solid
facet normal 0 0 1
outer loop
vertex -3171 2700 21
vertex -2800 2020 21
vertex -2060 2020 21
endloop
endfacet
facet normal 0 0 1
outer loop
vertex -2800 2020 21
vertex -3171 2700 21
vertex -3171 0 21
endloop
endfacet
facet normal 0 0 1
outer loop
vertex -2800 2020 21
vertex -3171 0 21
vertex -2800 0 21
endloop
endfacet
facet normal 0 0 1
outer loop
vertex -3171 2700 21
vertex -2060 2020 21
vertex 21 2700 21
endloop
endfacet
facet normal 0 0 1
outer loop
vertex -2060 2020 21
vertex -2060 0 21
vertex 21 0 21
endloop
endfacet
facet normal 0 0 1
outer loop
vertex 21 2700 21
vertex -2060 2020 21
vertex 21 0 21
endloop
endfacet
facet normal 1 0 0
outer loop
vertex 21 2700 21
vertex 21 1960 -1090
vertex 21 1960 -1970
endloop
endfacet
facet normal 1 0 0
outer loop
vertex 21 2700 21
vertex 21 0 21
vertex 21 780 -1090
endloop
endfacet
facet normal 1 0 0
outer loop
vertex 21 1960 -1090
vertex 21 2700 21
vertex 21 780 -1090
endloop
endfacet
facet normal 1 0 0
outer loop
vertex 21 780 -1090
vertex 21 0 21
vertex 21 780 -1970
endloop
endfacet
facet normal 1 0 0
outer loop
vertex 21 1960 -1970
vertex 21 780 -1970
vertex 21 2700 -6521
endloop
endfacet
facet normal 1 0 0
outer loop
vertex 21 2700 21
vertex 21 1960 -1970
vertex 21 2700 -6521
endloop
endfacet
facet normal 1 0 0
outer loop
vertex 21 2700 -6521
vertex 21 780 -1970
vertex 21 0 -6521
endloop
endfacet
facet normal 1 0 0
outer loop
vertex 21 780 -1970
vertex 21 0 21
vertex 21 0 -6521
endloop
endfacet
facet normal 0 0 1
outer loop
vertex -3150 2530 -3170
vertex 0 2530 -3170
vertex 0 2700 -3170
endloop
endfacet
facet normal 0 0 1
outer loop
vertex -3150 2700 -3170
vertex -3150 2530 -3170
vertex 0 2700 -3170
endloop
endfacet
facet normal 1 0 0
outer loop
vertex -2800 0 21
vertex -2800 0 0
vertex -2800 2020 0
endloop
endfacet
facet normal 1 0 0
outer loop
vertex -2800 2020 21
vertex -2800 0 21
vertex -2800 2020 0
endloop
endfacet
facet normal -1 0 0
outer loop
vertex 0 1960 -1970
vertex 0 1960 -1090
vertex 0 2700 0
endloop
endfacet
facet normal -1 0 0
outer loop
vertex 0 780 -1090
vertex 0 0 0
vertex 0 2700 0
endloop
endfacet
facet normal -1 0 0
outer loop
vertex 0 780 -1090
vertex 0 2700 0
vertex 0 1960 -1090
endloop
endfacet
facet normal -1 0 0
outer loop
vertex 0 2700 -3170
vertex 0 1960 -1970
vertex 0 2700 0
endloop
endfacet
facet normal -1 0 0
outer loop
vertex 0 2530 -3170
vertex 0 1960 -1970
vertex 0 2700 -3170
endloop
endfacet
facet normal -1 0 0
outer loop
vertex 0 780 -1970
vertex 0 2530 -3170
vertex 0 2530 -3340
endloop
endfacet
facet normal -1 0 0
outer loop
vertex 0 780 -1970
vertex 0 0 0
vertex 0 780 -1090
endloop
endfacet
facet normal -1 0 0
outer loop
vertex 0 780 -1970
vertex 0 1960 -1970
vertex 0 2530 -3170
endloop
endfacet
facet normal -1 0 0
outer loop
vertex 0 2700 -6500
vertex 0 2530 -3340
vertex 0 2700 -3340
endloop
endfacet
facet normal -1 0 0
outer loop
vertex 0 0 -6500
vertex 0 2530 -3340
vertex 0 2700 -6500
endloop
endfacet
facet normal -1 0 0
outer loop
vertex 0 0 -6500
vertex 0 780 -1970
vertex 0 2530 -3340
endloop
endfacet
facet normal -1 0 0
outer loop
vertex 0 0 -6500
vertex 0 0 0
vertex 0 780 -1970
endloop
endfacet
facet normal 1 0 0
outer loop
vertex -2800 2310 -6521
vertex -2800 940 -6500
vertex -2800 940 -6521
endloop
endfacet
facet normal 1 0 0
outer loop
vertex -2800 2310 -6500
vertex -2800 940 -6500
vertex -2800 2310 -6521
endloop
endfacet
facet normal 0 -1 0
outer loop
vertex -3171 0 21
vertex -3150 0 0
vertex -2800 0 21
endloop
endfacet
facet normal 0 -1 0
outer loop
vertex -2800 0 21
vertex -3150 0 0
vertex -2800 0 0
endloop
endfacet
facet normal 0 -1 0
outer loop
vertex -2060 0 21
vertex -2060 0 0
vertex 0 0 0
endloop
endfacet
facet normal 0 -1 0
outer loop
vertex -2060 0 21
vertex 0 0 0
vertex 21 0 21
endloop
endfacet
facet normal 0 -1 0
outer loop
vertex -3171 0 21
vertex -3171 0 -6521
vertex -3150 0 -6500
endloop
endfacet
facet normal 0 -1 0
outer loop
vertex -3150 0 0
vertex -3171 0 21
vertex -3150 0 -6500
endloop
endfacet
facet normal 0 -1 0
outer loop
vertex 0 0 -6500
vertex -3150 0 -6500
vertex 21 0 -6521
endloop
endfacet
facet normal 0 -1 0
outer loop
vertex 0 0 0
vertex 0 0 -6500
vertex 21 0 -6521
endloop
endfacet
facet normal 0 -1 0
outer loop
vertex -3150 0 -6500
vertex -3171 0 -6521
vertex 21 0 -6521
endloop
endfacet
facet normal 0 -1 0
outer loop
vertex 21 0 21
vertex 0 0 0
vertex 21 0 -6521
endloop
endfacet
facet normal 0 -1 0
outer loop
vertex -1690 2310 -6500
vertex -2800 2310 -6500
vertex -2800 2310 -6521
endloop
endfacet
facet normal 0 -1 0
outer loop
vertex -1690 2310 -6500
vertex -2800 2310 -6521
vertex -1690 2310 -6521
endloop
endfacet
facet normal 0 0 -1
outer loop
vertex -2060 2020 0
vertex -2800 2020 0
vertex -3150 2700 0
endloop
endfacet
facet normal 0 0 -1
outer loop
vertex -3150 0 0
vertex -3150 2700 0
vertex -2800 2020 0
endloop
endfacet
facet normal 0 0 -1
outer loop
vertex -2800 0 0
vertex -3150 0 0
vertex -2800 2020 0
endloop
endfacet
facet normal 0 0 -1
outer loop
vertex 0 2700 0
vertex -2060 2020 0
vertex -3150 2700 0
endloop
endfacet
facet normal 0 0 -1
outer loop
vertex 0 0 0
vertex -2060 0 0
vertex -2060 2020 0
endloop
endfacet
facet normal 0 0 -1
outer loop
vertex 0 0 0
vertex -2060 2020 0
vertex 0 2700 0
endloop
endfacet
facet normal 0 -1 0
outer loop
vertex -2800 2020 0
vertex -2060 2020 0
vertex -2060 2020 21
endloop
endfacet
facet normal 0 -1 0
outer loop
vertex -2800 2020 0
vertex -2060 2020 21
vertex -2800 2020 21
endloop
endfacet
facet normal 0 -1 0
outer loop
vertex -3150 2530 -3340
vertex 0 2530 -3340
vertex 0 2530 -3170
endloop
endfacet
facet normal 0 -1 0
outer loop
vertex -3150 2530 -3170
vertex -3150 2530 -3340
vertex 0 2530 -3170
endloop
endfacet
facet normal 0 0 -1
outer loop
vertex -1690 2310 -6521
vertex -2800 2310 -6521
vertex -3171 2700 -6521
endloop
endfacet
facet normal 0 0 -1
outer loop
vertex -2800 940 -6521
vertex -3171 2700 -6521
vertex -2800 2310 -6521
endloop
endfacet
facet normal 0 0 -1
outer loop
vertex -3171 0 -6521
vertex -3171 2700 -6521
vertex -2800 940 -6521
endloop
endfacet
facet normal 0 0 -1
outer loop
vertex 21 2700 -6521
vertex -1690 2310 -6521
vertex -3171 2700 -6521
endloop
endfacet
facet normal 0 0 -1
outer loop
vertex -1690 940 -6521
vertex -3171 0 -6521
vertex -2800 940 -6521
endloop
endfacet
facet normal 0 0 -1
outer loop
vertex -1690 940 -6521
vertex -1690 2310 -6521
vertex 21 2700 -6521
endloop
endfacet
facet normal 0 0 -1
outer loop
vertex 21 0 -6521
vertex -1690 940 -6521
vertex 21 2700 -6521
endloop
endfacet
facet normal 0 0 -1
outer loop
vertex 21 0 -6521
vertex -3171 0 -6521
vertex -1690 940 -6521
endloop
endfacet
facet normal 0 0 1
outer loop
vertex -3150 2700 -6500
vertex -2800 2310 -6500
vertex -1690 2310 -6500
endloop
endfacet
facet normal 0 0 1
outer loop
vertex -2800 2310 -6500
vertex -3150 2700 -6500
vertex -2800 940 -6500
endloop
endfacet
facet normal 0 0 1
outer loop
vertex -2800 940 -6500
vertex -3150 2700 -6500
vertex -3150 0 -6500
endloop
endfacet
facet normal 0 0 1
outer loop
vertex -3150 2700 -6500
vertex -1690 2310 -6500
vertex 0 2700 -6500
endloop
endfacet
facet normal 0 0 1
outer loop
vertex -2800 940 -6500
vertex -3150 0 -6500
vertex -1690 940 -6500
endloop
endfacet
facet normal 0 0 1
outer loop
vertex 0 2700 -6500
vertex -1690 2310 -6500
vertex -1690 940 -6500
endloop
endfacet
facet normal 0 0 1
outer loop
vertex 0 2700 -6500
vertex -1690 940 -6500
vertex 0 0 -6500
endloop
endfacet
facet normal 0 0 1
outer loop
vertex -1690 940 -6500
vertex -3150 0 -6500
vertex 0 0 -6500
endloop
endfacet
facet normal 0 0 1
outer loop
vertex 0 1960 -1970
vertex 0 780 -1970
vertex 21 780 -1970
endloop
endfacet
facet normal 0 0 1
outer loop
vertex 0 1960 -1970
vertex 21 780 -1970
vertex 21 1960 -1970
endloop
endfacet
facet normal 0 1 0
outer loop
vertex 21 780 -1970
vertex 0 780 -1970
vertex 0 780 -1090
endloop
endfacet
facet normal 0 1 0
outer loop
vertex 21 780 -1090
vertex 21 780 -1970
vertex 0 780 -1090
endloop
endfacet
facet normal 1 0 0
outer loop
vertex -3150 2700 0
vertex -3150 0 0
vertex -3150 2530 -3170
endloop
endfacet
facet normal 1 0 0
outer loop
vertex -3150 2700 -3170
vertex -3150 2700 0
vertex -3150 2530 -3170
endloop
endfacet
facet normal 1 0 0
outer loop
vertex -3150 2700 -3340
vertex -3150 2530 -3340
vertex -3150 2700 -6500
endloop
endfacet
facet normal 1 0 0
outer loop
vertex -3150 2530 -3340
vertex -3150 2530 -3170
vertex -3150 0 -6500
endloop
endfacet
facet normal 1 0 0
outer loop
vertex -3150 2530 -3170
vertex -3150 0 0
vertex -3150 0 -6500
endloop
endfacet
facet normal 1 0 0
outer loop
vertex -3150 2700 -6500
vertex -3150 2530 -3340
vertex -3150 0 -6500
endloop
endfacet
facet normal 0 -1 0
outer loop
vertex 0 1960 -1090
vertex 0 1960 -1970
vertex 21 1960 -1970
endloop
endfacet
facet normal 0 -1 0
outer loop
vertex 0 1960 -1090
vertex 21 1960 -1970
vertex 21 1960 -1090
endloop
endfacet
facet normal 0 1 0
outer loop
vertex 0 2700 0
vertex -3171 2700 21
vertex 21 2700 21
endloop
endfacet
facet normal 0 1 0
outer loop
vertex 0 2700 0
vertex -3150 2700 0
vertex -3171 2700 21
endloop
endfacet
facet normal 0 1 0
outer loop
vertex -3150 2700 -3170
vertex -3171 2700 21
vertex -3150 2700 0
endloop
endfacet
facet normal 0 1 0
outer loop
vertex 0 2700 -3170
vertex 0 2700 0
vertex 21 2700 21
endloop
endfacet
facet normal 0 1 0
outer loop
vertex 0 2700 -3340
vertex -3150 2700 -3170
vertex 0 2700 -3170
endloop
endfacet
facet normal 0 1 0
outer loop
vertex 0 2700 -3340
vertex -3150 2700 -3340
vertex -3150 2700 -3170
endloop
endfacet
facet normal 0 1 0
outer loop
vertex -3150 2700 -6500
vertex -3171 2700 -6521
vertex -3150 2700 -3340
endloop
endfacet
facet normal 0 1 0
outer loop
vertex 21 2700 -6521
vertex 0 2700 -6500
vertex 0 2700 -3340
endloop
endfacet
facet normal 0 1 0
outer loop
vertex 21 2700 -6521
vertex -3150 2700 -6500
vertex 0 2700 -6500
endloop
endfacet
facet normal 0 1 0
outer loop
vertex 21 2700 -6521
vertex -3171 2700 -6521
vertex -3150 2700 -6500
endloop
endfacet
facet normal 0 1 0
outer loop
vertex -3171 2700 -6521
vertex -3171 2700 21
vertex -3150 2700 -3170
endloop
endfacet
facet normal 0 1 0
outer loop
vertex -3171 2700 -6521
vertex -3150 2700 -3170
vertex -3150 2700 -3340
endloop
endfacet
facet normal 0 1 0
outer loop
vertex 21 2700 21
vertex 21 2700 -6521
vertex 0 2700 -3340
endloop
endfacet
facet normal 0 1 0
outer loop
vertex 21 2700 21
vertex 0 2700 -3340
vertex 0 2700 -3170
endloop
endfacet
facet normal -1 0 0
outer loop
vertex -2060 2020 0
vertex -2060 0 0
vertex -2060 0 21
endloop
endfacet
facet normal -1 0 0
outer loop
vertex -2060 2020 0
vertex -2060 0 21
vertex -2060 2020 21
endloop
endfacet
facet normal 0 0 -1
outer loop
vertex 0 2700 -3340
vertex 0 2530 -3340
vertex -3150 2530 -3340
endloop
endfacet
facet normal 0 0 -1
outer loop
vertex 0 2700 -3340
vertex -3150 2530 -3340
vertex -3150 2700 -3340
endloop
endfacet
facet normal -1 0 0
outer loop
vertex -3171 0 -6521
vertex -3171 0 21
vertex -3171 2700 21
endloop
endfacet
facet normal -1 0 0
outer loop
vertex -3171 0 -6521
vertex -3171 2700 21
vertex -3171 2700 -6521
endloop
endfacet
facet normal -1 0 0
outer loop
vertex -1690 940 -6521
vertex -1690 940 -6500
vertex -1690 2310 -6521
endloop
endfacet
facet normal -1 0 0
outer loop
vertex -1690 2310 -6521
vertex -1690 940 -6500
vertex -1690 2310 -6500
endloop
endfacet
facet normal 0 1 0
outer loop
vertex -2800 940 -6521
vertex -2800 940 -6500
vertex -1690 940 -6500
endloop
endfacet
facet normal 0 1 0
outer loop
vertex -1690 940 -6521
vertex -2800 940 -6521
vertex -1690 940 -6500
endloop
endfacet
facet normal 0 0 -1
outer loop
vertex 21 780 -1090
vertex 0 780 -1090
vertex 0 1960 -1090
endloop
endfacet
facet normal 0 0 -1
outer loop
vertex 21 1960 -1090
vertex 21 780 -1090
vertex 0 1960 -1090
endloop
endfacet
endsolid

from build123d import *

# Parameters (mm, degrees)
SKETCH_1_W            = 3192
SKETCH_1_H            = 6542
SKETCH_1_W_2          = 3150
SKETCH_1_H_2          = 6500
EXTRUDE_381_DEPTH     = 2700
SKETCH_2_W            = 740
SKETCH_2_H            = 2020
CUT_EXTRUDE_622_DEPTH = 22
SKETCH_3_W            = 880
SKETCH_3_H            = 1180
CUT_EXTRUDE_1_DEPTH   = 22
SKETCH_4_W            = 1110
SKETCH_4_H            = 1370
CUT_EXTRUDE_2_DEPTH   = 22
EXTRUDE_1378_REACH    = 3173
SKETCH_5_W            = 170
SKETCH_5_H            = 170


with BuildPart() as part:
    # 草图1 → Extrude 381 (new body)
    with BuildSketch(Plane(origin=(0, 0, 0), x_dir=(1, 0, 0), z_dir=(0, 1, 0))):
        with Locations((-1575, 3250)):
            Rectangle(SKETCH_1_W, SKETCH_1_H)
        with Locations((-1575, 3250)):
            Rectangle(SKETCH_1_W_2, SKETCH_1_H_2, mode=Mode.SUBTRACT)
    extrude(amount=EXTRUDE_381_DEPTH)

    # 草图2 → Cut-Extrude 622 (cut, through all)
    with BuildSketch(Plane(origin=(0, 0, 0), x_dir=(-1, 0, 0), z_dir=(0, 0, -1))):
        with Locations((2430, 1010)):
            Rectangle(SKETCH_2_W, SKETCH_2_H)
    extrude(amount=-CUT_EXTRUDE_622_DEPTH, mode=Mode.SUBTRACT)

    # 草图3 → 窗1 (cut, through all)
    with BuildSketch(Plane.ZY):
        with Locations((-1530, 1370)):
            Rectangle(SKETCH_3_W, SKETCH_3_H)
    extrude(amount=-CUT_EXTRUDE_1_DEPTH, mode=Mode.SUBTRACT)

    # 草图4 → 窗2 (cut, through all)
    with BuildSketch(Plane.XY.offset(-6500)):
        with Locations((-2245, 1625)):
            Rectangle(SKETCH_4_W, SKETCH_4_H)
    extrude(amount=-CUT_EXTRUDE_2_DEPTH, mode=Mode.SUBTRACT)

    # 草图5 → Extrude 1378 (add, up to next)
    with BuildSketch(Plane.ZY, mode=Mode.PRIVATE) as extrude_1378_sk1:
        with Locations((-3255, 2615)):
            Rectangle(SKETCH_5_W, SKETCH_5_H)
    extrude_1378_tool1 = extrude(extrude_1378_sk1.sketch, amount=EXTRUDE_1378_REACH, mode=Mode.PRIVATE) - part.part
    add(extrude_1378_tool1.solids().sort_by_distance((0, 2615, -3255))[0])


solid = part.part
